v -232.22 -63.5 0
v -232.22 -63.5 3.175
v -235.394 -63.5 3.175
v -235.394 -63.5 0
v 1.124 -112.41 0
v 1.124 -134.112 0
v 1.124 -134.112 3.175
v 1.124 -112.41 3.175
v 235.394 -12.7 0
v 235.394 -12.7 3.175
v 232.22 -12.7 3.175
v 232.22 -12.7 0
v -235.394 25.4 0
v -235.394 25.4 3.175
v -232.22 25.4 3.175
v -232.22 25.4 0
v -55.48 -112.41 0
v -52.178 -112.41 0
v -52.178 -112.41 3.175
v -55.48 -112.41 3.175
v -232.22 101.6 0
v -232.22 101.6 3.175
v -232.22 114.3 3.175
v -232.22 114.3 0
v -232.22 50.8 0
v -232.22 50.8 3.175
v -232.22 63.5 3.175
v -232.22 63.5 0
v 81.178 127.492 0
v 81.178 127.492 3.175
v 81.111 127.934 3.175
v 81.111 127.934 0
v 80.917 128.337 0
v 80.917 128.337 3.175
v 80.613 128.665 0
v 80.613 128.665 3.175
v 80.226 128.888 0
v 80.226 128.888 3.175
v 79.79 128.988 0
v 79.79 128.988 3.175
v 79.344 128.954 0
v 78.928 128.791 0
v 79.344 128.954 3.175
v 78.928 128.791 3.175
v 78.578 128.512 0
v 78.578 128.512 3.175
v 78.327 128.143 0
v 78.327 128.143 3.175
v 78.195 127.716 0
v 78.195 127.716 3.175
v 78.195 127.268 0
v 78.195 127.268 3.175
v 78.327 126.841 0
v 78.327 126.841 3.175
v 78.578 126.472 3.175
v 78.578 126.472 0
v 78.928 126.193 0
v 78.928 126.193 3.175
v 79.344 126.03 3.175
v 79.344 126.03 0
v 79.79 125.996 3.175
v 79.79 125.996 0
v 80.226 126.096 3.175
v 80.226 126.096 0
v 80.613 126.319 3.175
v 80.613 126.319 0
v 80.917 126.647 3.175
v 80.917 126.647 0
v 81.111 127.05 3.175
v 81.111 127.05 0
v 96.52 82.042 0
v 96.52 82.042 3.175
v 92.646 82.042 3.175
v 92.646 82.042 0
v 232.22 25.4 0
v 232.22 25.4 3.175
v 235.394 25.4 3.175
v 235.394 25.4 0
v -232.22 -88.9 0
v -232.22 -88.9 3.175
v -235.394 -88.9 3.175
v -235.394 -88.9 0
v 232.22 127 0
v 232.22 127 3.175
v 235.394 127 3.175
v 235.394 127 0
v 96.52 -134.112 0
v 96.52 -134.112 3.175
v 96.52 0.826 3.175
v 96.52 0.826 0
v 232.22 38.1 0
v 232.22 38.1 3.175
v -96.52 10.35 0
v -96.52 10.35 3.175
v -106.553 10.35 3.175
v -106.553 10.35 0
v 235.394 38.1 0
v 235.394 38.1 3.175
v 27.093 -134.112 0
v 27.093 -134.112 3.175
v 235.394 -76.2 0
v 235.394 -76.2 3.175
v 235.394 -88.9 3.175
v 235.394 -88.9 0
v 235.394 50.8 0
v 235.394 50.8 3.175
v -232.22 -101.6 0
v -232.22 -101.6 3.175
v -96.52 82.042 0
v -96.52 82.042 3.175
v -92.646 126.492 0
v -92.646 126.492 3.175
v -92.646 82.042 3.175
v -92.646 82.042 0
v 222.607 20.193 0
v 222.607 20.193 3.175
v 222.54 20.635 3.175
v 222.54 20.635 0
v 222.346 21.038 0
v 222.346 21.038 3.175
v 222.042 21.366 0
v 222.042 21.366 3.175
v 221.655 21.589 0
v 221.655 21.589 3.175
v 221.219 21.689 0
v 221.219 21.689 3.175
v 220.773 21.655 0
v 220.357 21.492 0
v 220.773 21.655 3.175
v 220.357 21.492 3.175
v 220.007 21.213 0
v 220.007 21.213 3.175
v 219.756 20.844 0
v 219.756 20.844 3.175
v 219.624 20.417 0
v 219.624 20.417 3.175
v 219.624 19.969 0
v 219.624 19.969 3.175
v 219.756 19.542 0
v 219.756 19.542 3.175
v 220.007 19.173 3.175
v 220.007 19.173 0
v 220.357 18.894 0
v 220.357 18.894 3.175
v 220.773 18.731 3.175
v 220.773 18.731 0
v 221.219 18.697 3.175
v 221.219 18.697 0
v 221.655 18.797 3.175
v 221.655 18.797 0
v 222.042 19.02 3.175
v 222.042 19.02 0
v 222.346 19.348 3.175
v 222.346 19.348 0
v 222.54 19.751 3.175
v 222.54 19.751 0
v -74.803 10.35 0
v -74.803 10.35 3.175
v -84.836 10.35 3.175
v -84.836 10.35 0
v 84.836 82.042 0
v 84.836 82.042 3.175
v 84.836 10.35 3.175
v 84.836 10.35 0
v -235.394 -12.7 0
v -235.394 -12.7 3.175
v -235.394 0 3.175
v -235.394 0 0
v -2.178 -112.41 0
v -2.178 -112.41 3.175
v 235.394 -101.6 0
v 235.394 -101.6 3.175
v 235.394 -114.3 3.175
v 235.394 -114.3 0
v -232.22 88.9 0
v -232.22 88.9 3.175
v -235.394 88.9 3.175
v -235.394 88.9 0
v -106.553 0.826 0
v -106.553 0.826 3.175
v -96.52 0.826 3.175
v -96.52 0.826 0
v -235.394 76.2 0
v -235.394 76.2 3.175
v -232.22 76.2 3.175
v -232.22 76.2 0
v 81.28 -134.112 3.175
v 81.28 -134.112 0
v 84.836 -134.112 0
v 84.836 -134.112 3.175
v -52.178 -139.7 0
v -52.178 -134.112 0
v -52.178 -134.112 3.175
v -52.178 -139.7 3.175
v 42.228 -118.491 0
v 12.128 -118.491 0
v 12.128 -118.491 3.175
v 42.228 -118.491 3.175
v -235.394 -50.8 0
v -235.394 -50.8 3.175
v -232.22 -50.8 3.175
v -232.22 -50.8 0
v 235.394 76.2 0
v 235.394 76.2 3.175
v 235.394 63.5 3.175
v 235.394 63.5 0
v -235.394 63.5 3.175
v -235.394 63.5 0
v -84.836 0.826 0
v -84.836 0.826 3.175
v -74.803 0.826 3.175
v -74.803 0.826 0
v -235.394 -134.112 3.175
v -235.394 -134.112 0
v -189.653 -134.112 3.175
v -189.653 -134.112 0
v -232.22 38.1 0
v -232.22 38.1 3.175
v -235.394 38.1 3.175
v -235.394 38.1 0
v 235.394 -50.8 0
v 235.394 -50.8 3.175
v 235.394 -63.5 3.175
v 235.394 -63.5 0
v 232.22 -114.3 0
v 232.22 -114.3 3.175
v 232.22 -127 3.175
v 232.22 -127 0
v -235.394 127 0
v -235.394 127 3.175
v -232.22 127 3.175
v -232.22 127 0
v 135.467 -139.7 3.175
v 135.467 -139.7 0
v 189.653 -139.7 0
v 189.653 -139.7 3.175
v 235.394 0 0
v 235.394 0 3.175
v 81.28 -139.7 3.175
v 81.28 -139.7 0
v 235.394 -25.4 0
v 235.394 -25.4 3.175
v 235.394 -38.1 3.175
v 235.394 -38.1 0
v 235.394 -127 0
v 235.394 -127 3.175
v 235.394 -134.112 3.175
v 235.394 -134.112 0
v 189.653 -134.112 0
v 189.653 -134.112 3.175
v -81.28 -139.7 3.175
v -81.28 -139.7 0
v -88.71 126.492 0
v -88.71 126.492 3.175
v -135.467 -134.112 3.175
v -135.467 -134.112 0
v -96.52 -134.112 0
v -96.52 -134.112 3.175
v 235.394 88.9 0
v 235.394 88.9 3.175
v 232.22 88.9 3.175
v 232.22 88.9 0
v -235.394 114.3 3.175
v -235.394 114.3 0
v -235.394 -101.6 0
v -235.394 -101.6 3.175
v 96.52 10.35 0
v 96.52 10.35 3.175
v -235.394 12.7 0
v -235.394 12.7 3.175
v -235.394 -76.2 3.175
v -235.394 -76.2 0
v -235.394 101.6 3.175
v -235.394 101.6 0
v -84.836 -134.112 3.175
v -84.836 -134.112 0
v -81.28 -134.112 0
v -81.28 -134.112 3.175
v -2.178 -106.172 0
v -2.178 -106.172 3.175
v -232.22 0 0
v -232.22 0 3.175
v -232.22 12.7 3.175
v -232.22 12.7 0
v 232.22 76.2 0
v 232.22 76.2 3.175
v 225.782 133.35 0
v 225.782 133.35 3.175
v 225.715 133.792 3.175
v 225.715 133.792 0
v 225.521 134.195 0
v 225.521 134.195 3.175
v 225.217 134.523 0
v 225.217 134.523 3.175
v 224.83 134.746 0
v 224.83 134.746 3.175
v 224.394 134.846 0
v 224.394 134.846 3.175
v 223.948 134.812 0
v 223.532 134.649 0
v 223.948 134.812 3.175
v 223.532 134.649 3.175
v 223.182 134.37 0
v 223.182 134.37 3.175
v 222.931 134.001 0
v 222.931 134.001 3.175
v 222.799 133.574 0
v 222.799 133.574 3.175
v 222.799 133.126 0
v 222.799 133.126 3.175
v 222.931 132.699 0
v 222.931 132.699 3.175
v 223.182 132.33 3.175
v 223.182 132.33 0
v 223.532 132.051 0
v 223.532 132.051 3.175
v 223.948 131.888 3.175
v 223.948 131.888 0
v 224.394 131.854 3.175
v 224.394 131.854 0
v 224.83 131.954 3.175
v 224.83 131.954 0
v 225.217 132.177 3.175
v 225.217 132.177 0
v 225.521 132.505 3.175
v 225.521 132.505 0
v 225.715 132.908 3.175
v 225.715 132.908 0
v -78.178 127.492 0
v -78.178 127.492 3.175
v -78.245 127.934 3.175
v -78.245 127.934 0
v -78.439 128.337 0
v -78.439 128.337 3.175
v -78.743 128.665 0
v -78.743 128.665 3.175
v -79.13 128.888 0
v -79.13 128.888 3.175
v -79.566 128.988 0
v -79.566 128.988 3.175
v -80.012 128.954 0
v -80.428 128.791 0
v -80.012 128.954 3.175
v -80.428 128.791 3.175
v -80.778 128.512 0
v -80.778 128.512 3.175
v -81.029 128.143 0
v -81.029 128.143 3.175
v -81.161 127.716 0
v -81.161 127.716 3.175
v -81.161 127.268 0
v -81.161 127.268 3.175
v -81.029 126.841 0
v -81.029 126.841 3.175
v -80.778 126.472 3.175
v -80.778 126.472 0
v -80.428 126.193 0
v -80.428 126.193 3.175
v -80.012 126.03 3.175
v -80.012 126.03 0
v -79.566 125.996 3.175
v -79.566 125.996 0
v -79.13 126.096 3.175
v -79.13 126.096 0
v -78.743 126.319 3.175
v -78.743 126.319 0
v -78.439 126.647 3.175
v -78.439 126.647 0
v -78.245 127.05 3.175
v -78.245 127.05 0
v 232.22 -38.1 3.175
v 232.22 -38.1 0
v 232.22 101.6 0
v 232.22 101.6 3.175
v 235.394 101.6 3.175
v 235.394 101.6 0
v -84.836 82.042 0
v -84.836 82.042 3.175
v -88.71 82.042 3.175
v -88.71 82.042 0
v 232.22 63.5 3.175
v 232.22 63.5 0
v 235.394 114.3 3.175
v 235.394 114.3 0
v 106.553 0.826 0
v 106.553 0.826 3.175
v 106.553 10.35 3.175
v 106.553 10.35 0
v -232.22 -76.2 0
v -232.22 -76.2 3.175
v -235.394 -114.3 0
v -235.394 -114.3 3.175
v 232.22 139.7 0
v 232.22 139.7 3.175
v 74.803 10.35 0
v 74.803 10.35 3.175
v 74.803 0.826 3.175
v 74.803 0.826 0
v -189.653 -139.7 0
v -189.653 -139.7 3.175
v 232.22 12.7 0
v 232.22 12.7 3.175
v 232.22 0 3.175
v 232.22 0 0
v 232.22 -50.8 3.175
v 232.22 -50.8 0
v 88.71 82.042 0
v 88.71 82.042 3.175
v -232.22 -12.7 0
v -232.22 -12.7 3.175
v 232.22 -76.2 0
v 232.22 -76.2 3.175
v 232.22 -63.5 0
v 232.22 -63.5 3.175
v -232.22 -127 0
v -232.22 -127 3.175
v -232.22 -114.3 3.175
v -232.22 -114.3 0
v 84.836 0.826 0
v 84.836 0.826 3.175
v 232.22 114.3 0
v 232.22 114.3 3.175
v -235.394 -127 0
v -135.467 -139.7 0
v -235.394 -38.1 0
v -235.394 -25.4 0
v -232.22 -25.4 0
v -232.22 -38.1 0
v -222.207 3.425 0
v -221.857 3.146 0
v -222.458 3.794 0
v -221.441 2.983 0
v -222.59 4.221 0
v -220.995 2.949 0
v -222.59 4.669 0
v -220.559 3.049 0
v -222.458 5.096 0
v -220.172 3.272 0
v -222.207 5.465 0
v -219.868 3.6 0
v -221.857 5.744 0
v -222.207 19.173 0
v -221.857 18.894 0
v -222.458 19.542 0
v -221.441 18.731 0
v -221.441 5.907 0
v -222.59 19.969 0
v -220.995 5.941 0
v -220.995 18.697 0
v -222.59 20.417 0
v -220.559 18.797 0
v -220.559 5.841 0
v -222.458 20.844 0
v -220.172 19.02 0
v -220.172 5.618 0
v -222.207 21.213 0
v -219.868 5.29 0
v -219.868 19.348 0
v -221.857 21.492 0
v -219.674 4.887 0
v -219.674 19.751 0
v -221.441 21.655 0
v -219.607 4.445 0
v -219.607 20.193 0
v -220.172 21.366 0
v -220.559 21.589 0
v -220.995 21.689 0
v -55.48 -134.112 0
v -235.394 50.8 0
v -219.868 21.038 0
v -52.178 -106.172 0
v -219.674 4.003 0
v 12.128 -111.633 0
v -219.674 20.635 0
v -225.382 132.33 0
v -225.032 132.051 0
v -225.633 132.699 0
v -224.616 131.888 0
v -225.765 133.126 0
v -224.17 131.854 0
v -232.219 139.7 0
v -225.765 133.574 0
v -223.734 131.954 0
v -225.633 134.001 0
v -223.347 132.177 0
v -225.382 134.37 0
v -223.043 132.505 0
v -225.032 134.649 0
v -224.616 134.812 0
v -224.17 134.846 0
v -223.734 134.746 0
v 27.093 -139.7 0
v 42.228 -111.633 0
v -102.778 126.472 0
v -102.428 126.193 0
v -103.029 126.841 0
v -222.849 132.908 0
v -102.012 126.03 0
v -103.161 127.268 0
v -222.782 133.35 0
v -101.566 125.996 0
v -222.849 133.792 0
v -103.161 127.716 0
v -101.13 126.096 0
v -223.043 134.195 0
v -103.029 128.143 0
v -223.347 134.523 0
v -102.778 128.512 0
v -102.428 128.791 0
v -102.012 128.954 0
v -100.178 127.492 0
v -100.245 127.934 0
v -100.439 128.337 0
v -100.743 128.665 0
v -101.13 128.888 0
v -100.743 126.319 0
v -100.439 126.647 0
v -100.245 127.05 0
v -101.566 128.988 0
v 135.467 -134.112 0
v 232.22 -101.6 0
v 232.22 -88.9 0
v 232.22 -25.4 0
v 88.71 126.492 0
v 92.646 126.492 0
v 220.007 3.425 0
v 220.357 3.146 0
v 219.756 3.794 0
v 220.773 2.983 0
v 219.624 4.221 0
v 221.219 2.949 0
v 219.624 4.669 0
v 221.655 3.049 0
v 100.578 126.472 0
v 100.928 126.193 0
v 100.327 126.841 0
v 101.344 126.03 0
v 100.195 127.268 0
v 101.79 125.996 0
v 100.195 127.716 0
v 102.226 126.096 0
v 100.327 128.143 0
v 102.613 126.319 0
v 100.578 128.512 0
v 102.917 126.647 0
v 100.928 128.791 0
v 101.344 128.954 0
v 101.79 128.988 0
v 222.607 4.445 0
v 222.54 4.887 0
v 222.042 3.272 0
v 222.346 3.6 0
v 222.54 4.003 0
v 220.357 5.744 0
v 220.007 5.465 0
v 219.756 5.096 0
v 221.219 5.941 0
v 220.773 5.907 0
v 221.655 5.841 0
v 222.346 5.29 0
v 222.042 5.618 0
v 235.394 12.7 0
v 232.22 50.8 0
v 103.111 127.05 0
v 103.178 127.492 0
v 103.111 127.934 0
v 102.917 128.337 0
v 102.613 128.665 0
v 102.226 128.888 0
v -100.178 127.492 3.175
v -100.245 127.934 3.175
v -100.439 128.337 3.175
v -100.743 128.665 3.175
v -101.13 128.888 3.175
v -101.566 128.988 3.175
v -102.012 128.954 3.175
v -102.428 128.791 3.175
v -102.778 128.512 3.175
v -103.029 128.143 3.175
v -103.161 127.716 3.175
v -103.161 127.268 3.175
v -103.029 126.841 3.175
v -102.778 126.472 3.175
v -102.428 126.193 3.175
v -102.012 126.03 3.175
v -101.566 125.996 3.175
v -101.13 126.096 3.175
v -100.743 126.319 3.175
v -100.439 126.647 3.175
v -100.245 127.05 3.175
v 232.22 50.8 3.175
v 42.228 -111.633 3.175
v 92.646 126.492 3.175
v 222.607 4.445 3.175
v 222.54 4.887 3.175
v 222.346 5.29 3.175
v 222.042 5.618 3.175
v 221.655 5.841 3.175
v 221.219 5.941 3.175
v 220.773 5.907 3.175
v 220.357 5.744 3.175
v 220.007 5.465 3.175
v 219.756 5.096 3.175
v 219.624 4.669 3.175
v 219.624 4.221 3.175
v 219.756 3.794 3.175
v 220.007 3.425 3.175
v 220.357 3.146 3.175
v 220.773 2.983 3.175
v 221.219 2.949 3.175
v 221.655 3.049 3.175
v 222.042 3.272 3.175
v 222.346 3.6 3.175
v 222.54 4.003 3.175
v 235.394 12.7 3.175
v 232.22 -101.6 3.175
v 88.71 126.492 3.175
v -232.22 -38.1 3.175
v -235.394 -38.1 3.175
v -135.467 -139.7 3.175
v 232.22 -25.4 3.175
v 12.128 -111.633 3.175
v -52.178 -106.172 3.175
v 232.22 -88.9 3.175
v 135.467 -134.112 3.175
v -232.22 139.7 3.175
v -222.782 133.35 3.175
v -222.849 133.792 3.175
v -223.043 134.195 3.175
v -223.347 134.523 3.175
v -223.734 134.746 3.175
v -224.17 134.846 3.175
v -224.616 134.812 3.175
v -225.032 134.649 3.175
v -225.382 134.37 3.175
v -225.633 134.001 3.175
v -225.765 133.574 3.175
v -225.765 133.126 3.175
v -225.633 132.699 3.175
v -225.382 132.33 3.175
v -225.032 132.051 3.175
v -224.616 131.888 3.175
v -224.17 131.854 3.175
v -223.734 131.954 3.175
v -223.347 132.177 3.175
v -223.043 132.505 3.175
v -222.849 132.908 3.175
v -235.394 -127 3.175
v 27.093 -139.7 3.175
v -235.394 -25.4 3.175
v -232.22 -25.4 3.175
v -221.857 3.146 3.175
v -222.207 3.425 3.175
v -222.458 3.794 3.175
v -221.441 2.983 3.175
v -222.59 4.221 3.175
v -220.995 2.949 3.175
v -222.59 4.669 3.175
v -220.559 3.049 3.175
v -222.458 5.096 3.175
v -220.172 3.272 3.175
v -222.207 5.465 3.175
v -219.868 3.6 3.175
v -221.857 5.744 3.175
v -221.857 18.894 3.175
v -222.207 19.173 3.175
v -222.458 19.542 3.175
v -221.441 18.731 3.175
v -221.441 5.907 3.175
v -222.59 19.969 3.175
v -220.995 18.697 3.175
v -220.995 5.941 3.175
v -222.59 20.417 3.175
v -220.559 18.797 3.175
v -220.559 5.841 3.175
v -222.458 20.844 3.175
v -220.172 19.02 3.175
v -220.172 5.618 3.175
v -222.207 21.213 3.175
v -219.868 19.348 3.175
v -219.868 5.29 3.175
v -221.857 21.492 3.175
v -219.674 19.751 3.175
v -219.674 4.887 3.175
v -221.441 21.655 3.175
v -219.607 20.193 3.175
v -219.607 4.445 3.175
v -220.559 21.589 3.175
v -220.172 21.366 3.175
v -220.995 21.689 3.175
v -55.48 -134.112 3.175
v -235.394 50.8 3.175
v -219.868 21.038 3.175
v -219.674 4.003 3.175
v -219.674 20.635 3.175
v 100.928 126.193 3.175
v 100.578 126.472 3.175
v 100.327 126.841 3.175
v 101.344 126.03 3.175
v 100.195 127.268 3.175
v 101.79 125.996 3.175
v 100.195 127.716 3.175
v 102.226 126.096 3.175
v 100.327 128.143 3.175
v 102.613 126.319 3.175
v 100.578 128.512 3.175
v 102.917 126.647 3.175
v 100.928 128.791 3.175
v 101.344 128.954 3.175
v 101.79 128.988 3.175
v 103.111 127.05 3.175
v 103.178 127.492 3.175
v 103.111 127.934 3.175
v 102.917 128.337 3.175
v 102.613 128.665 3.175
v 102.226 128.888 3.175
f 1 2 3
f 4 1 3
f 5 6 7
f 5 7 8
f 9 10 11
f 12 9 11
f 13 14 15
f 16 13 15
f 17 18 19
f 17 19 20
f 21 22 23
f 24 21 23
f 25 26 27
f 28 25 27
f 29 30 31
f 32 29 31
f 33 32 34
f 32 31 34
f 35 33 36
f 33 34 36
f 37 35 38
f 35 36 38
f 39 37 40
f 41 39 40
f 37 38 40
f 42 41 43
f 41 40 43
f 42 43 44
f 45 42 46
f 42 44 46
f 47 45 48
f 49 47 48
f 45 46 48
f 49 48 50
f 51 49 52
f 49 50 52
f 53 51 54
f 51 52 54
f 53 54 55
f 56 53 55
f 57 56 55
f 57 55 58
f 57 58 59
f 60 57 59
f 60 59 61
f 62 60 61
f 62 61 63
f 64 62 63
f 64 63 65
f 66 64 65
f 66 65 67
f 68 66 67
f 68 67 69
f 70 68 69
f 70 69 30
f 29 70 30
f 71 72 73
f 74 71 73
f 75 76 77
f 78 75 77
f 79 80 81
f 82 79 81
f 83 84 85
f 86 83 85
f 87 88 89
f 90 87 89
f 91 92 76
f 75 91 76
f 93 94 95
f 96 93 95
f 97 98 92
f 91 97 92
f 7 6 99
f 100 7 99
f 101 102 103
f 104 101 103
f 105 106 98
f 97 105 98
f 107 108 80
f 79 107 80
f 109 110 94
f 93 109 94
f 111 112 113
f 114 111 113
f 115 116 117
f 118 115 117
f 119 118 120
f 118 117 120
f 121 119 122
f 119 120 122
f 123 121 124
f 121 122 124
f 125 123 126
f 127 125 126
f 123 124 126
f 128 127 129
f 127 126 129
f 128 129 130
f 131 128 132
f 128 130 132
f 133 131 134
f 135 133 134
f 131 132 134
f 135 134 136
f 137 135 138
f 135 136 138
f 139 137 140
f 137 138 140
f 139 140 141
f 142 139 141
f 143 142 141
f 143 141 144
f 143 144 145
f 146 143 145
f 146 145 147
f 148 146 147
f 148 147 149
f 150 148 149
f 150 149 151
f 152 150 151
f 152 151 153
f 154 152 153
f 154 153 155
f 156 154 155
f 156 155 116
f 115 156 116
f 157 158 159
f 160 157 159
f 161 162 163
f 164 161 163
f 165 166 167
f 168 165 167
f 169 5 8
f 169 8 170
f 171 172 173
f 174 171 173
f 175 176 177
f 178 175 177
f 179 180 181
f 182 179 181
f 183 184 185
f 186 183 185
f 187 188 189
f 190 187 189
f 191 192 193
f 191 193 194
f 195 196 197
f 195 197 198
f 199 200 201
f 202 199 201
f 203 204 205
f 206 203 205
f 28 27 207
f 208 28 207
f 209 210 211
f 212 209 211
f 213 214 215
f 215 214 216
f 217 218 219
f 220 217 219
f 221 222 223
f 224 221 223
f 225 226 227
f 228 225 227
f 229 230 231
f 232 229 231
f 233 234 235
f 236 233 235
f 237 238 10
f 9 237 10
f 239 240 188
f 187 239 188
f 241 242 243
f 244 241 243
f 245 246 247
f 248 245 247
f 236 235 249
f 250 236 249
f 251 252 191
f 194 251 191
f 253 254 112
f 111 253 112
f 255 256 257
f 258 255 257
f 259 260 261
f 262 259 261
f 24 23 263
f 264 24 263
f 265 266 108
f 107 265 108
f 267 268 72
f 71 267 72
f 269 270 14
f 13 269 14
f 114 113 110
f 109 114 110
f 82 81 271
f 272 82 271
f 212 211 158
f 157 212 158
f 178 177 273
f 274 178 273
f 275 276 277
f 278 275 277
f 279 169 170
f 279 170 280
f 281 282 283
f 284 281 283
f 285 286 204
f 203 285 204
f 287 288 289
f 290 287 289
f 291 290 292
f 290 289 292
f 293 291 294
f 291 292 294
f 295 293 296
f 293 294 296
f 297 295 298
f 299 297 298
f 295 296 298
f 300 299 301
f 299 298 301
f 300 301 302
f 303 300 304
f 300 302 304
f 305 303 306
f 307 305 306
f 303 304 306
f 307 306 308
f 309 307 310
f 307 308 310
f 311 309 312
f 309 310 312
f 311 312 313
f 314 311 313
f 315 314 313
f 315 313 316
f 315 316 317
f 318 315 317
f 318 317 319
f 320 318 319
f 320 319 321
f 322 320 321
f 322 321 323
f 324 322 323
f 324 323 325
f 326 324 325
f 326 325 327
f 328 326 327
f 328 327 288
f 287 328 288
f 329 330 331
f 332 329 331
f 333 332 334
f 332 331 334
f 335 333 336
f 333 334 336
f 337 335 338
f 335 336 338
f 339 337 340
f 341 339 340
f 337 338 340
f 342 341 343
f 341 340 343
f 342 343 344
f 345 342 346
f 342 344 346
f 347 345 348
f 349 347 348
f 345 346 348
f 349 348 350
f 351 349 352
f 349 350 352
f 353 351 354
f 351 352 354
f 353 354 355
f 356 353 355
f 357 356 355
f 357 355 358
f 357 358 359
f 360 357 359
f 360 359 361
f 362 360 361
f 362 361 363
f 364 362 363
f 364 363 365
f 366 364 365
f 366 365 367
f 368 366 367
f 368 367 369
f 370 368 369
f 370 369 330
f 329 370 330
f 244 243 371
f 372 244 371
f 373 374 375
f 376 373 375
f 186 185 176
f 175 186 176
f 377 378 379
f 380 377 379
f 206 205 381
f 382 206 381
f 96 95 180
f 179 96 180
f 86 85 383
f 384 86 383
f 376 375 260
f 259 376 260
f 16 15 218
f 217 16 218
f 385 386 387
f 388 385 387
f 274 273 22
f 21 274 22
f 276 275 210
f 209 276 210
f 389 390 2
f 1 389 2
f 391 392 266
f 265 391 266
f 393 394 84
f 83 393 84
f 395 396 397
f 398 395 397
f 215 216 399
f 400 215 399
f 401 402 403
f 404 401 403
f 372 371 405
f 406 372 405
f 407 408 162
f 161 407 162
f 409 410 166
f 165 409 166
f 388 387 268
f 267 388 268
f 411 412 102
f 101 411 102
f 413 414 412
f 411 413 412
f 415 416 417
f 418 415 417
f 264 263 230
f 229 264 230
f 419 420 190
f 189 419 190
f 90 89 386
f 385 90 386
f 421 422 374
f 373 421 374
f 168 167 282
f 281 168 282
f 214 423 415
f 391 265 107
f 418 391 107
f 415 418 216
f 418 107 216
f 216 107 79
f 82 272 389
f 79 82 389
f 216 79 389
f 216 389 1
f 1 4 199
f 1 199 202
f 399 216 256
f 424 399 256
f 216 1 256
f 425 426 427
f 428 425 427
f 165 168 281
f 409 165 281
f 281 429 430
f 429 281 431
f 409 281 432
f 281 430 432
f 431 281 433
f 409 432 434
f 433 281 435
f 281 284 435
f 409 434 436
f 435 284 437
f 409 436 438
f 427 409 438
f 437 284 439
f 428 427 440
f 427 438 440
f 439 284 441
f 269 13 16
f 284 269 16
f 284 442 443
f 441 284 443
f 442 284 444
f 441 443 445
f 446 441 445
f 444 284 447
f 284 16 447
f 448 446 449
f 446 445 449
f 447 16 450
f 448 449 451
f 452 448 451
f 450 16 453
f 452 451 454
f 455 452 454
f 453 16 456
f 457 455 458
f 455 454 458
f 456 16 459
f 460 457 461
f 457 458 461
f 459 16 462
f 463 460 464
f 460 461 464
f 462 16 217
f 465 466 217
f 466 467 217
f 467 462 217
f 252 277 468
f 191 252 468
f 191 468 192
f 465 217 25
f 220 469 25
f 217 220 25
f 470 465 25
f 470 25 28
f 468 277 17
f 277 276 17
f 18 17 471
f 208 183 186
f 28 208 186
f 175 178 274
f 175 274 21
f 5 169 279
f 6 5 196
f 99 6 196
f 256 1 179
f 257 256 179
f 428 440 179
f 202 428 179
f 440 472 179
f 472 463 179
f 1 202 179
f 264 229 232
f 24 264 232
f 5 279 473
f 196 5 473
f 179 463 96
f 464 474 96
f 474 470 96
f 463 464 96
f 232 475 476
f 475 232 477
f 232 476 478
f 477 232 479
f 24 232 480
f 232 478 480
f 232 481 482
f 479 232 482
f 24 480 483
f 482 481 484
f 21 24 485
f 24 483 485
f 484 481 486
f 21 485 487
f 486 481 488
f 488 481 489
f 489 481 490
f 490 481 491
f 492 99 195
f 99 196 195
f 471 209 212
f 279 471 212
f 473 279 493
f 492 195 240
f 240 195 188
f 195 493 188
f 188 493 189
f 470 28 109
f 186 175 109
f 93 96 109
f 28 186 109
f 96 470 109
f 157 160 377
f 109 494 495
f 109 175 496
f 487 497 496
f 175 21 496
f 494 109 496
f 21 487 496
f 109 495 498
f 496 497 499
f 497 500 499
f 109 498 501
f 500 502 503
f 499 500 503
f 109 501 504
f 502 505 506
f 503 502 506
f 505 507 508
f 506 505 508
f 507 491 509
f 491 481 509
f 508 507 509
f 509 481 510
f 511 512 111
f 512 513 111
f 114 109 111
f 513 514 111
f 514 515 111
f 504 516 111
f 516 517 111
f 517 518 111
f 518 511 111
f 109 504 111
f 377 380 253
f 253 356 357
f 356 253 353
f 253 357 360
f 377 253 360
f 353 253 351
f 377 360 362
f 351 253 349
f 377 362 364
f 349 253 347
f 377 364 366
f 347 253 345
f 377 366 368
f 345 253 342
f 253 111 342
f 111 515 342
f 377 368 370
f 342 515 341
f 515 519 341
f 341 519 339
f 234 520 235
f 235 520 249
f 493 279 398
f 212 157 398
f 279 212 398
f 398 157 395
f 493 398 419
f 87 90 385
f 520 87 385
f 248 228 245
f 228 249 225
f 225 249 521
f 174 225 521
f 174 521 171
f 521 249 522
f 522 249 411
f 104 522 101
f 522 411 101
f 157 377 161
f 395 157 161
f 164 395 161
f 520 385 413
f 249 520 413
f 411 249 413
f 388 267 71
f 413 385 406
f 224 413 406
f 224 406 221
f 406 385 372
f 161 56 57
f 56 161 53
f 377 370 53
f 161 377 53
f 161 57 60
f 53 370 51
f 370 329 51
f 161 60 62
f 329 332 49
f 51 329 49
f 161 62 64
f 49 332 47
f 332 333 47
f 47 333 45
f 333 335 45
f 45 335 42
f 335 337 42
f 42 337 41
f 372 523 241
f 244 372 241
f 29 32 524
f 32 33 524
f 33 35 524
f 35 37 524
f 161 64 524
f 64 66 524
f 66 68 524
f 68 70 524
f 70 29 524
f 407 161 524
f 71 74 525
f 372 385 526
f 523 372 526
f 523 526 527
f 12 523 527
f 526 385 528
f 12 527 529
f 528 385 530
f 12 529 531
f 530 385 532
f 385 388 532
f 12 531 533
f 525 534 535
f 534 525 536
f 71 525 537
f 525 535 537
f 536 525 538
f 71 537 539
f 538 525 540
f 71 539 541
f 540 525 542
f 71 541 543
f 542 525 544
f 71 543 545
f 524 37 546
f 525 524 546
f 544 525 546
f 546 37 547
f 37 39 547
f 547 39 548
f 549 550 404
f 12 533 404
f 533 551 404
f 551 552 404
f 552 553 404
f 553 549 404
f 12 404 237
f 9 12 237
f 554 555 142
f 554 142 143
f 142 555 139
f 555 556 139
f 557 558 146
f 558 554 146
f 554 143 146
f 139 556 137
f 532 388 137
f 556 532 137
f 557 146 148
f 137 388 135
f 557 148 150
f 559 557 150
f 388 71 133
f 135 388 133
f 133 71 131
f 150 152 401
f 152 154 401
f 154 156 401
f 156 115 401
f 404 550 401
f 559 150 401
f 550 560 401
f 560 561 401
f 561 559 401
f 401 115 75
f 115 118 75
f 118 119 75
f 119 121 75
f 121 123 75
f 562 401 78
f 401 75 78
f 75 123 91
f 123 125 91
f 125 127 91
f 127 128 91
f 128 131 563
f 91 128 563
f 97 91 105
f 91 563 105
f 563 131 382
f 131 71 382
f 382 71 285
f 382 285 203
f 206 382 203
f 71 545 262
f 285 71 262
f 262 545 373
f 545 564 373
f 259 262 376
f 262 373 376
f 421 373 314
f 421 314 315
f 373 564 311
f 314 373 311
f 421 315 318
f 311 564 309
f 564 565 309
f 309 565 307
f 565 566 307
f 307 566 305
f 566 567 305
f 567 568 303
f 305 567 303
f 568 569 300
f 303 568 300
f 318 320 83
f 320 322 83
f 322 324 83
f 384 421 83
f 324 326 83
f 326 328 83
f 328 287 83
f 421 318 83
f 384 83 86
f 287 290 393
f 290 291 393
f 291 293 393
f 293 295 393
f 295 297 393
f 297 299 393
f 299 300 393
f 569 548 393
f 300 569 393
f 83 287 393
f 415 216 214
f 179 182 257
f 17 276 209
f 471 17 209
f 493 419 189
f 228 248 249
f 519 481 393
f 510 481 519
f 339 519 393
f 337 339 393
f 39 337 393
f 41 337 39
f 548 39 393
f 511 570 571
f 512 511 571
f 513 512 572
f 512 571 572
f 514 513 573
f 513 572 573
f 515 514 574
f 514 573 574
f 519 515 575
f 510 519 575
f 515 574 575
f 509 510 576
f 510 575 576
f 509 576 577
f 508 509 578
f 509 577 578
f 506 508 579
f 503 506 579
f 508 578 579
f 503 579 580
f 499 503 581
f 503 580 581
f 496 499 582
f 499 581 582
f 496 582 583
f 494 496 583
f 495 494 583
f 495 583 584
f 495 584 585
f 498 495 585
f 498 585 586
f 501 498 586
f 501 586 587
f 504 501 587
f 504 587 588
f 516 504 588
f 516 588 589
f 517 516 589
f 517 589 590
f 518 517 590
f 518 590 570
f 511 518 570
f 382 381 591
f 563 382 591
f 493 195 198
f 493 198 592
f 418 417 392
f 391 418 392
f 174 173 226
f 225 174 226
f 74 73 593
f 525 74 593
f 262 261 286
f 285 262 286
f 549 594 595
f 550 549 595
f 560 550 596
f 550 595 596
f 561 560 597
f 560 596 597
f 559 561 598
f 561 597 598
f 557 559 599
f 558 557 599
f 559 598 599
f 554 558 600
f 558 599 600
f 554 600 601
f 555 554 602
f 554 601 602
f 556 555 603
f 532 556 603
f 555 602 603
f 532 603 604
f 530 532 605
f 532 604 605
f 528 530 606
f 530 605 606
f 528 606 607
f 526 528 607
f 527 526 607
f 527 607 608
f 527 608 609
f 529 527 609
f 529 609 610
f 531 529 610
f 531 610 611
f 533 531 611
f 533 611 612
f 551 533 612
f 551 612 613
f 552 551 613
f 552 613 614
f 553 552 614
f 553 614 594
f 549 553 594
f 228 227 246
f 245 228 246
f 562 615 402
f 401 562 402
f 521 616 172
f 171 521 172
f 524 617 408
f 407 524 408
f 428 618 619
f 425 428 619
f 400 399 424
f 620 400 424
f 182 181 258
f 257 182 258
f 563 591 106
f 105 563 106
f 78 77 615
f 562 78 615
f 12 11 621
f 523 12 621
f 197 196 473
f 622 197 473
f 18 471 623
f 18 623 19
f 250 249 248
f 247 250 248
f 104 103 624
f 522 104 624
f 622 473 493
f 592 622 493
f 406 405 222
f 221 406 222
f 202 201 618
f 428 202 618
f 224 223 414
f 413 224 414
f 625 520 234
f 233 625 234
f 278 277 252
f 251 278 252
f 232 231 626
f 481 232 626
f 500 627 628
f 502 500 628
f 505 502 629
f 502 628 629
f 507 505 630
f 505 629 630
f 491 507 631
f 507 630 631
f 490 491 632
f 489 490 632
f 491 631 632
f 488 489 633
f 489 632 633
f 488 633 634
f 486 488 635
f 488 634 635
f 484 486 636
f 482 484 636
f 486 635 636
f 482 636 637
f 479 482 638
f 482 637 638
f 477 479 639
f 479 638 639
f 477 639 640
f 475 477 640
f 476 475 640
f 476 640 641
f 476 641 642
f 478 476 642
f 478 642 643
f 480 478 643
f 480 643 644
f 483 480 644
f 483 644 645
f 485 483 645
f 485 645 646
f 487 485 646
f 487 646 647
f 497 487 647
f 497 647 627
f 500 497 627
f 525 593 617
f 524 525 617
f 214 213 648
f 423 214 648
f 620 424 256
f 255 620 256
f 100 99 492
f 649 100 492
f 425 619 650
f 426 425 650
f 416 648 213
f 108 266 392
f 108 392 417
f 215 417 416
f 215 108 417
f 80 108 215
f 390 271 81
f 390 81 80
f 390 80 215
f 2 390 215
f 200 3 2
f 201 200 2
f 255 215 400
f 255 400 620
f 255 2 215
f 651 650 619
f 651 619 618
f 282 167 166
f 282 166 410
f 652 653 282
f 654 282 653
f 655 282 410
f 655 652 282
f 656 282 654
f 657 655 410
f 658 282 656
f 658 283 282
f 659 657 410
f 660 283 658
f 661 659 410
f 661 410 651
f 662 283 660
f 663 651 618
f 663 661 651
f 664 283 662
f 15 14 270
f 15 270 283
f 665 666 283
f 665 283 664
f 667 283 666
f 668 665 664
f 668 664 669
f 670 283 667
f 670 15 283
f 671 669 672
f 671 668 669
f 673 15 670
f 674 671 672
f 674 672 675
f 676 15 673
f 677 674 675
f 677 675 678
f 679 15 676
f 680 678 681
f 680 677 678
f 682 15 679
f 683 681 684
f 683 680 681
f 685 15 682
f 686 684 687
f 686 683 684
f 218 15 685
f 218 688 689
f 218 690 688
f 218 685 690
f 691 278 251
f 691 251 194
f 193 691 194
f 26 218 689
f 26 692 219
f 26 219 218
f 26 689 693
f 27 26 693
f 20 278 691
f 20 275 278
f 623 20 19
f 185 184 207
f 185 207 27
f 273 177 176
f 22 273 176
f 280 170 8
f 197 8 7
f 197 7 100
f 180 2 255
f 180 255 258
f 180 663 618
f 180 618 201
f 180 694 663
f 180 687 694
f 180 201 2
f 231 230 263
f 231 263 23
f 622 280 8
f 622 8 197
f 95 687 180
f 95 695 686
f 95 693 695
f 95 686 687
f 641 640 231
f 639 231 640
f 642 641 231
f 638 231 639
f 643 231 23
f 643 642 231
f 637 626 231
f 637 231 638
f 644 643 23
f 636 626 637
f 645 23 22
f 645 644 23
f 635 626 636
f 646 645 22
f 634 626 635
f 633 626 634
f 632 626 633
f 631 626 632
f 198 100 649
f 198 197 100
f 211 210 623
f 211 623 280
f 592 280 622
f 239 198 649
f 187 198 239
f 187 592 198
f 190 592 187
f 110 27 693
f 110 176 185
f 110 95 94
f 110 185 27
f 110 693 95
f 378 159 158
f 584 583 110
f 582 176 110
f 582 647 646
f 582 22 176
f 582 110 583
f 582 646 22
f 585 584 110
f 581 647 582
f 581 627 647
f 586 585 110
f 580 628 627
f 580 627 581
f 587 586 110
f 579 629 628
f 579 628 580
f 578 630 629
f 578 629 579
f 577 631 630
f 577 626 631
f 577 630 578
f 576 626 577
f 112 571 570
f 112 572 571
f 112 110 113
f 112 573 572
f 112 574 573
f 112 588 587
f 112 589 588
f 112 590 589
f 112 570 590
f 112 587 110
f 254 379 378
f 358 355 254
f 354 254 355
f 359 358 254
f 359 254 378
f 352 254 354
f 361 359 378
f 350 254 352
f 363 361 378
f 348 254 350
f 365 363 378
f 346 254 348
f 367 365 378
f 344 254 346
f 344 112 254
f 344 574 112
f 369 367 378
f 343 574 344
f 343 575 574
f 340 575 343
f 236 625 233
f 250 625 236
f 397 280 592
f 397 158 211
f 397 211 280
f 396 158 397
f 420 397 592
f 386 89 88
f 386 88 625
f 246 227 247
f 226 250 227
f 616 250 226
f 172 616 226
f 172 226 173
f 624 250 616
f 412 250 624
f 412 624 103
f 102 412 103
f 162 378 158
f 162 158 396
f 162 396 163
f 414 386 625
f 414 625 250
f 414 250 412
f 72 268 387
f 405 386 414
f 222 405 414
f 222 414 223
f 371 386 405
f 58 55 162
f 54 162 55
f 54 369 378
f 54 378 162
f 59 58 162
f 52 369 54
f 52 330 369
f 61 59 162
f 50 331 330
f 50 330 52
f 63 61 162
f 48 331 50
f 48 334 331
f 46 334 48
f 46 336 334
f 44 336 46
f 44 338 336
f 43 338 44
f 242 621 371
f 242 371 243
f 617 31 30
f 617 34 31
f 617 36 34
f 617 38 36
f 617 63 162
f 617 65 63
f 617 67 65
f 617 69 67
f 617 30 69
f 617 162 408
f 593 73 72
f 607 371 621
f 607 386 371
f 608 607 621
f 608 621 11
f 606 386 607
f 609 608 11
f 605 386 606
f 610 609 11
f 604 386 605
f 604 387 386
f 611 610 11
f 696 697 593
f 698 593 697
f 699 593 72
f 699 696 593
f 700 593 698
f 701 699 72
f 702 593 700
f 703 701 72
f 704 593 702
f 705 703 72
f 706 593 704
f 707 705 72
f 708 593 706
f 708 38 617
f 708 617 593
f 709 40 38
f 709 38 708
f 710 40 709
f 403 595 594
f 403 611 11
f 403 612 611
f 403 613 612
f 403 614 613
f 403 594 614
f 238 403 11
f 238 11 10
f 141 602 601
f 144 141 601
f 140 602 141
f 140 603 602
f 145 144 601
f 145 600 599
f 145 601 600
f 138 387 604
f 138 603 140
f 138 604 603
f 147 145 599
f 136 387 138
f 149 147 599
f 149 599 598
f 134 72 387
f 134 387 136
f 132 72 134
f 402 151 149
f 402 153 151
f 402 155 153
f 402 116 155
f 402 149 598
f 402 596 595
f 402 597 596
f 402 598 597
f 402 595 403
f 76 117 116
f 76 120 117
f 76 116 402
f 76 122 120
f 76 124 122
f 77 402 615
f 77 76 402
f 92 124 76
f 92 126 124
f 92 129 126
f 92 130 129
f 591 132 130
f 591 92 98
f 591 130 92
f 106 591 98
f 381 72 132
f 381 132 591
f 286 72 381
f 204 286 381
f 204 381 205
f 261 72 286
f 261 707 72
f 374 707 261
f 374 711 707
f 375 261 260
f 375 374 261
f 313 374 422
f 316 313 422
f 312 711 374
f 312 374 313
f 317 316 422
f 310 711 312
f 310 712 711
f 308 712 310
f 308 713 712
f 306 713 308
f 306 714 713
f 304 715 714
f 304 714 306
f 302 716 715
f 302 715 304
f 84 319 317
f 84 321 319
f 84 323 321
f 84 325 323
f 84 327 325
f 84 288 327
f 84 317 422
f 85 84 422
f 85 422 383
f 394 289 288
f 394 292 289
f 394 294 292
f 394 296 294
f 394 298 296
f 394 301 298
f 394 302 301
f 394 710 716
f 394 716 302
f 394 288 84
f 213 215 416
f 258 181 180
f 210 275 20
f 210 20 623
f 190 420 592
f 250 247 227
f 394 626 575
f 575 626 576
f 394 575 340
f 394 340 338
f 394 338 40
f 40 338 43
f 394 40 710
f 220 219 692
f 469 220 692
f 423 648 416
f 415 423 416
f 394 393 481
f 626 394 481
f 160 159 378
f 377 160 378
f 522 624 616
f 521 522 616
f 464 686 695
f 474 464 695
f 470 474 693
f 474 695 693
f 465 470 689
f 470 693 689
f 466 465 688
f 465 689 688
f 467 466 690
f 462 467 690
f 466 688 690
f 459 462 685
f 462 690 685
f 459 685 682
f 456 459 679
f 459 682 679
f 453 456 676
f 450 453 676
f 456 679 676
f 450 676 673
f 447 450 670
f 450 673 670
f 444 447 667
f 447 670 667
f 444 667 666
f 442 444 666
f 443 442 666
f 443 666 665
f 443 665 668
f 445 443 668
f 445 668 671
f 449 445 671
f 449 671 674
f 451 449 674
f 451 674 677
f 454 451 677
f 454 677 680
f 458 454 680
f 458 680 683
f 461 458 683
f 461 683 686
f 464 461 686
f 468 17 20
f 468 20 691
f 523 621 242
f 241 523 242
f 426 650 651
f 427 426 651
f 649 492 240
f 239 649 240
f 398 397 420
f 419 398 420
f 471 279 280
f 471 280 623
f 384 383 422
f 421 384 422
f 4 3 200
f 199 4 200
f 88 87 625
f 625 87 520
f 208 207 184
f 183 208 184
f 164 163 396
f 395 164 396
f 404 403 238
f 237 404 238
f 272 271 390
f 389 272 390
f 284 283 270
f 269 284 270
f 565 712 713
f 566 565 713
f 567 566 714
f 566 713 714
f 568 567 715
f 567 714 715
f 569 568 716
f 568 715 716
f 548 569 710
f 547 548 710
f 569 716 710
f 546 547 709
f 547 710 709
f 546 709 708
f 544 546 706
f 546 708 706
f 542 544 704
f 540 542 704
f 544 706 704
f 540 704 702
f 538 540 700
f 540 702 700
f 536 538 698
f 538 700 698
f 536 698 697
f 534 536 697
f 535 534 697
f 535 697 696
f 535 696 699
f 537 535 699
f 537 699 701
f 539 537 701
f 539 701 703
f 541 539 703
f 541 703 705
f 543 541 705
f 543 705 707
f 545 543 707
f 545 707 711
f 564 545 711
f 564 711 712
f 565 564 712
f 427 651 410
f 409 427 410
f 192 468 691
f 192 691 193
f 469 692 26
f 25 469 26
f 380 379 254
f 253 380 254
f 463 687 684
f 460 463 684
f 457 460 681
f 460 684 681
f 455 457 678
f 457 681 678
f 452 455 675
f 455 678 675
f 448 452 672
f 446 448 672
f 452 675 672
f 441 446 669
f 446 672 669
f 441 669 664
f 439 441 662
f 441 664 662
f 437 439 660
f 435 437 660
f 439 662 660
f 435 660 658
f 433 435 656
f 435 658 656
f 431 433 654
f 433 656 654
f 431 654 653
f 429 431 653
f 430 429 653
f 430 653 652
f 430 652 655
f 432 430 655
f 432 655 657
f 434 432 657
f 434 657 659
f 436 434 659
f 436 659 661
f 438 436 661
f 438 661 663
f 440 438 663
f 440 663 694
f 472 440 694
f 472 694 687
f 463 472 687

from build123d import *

# Parameters (mm, degrees)
SKETCH1_W                    = 3.175
SKETCH1_H                    = 12.7
MAIN_EXTRUDE_DEPTH           = 3.175
SKETCH8_R                    = 1.5
SKETCH8_W                    = 3.175
SKETCH8_H                    = 31.877
MOUNT_HOLES_DEPTH            = 430.752406189
DOOR_SLOTS_DEPTH             = 430.752406189
SKETCH4_W                    = 30.099999998
SKETCH4_H                    = 6.858
TROUGH_AND_LEVER_HOLES_DEPTH = 430.752406189
SKETCH10_R                   = 1.5
DOOR_GUIDE_MOUNT_HOLES_DEPTH = 430.752406189
SKETCH12_R                   = 1.5
EXTENSION_CLIP_HOLES_DEPTH   = 430.752406189
EXTENSION_CENTER_CUT_DEPTH   = 430.752406189


with BuildPart() as part:
    # Sketch1 → Main Extrude (new body)
    with BuildSketch(Plane.XY):
        Polygon((-381, 139.7), (-406.4, 139.7), (-406.4, -139.7), (-352.213333333, -139.7), (-352.213333333, -134.112), (-298.026666667, -134.112), (-298.026666667, -139.7), (-243.84, -139.7), (-243.84, -134.112), (-189.653333333, -134.112), (-189.653333333, -139.7), (-135.466666667, -139.7), (-135.466666667, -134.112), (-81.28, -134.112), (-81.28, -139.7), (-27.093333333, -139.7), (-27.093333333, -134.112), (27.093333333, -134.112), (27.093333333, -139.7), (81.28, -139.7), (81.28, -134.112), (135.466666667, -134.112), (135.466666667, -139.7), (189.653333333, -139.7), (189.653333333, -134.112), (243.84, -134.112), (243.84, -139.7), (298.026666667, -139.7), (298.026666667, -134.112), (352.213333333, -134.112), (352.213333333, -139.7), (406.4, -139.7), (406.4, 139.7), (381, 139.7), (381, 127), (377.825, 127), (377.825, 139.7), (-377.825, 139.7), (-377.825, 127), (-381, 127), align=None)
        with Locations((-379.4125, 107.95)):
            Rectangle(SKETCH1_W, SKETCH1_H, mode=Mode.SUBTRACT)
        with Locations((-379.4125, 82.55)):
            Rectangle(SKETCH1_W, SKETCH1_H, mode=Mode.SUBTRACT)
        with Locations((-379.4125, 57.15)):
            Rectangle(SKETCH1_W, SKETCH1_H, mode=Mode.SUBTRACT)
        with Locations((-379.4125, 31.75)):
            Rectangle(SKETCH1_W, SKETCH1_H, mode=Mode.SUBTRACT)
        with Locations((-379.4125, 6.35)):
            Rectangle(SKETCH1_W, SKETCH1_H, mode=Mode.SUBTRACT)
        with Locations((-379.4125, -19.05)):
            Rectangle(SKETCH1_W, SKETCH1_H, mode=Mode.SUBTRACT)
        with Locations((-379.4125, -44.45)):
            Rectangle(SKETCH1_W, SKETCH1_H, mode=Mode.SUBTRACT)
        with Locations((-379.4125, -69.85)):
            Rectangle(SKETCH1_W, SKETCH1_H, mode=Mode.SUBTRACT)
        with Locations((-379.4125, -95.25)):
            Rectangle(SKETCH1_W, SKETCH1_H, mode=Mode.SUBTRACT)
        with Locations((-379.4125, -120.65)):
            Rectangle(SKETCH1_W, SKETCH1_H, mode=Mode.SUBTRACT)
        with Locations((379.4125, 107.95)):
            Rectangle(SKETCH1_W, SKETCH1_H, mode=Mode.SUBTRACT)
        with Locations((379.4125, 82.55)):
            Rectangle(SKETCH1_W, SKETCH1_H, mode=Mode.SUBTRACT)
        with Locations((379.4125, 57.15)):
            Rectangle(SKETCH1_W, SKETCH1_H, mode=Mode.SUBTRACT)
        with Locations((379.4125, 31.75)):
            Rectangle(SKETCH1_W, SKETCH1_H, mode=Mode.SUBTRACT)
        with Locations((379.4125, 6.35)):
            Rectangle(SKETCH1_W, SKETCH1_H, mode=Mode.SUBTRACT)
        with Locations((379.4125, -19.05)):
            Rectangle(SKETCH1_W, SKETCH1_H, mode=Mode.SUBTRACT)
        with Locations((379.4125, -44.45)):
            Rectangle(SKETCH1_W, SKETCH1_H, mode=Mode.SUBTRACT)
        with Locations((379.4125, -69.85)):
            Rectangle(SKETCH1_W, SKETCH1_H, mode=Mode.SUBTRACT)
        with Locations((379.4125, -95.25)):
            Rectangle(SKETCH1_W, SKETCH1_H, mode=Mode.SUBTRACT)
        with Locations((379.4125, -120.65)):
            Rectangle(SKETCH1_W, SKETCH1_H, mode=Mode.SUBTRACT)
    extrude(amount=MAIN_EXTRUDE_DEPTH)

    # Sketch8 → Mount Holes (cut, through all)
    with BuildSketch(Plane.XY.offset(3.175)):
        with Locations((-393.7, -120.65)):
            Circle(SKETCH8_R)
        with Locations((393.7, -120.65)):
            Circle(SKETCH8_R)
        with Locations((-382.5875, 12.319)):
            Rectangle(SKETCH8_W, SKETCH8_H)
        with Locations((382.5875, 12.319)):
            Rectangle(SKETCH8_W, SKETCH8_H)
    extrude(amount=-MOUNT_HOLES_DEPTH, mode=Mode.SUBTRACT)

    # Sketch3 → Door Slots (cut, through all)
    with BuildSketch(Plane.XY.offset(3.175)):
        Polygon((-88.7095, 126.492), (-92.6465, 126.492), (-92.6465, 82.042), (-96.52, 82.042), (-96.52, 10.3505), (-106.553, 10.3505), (-106.553, 0.8255), (-96.52, 0.8255), (-96.52, -134.112), (-84.836, -134.112), (-84.836, 0.8255), (-74.803, 0.8255), (-74.803, 10.3505), (-84.836, 10.3505), (-84.836, 82.042), (-88.7095, 82.042), align=None)
        Polygon((92.6465, 126.492), (88.7095, 126.492), (88.7095, 82.042), (84.836, 82.042), (84.836, 10.3505), (74.803, 10.3505), (74.803, 0.8255), (84.836, 0.8255), (84.836, -134.112), (96.52, -134.112), (96.52, 0.8255), (106.553, 0.8255), (106.553, 10.3505), (96.52, 10.3505), (96.52, 82.042), (92.6465, 82.042), align=None)
    extrude(amount=-DOOR_SLOTS_DEPTH, mode=Mode.SUBTRACT)

    # Sketch4 → Trough and Lever Holes (cut, through all)
    with BuildSketch(Plane.XY):
        Polygon((-52.178, -112.41), (-55.48, -112.41), (-55.48, -134.112), (-52.178, -134.112), (-52.178, -139.7), (-2.178, -139.7), (-2.178, -134.112), (1.124, -134.112), (1.124, -112.41), (-2.178, -112.41), (-2.178, -106.172), (-52.178, -106.172), align=None)
        with Locations((27.178, -115.062)):
            Rectangle(SKETCH4_W, SKETCH4_H)
    extrude(amount=TROUGH_AND_LEVER_HOLES_DEPTH, mode=Mode.SUBTRACT)

    # Sketch10 → Door Guide Mount Holes (cut, through all)
    with BuildSketch(Plane.XY.offset(3.175)):
        with Locations((-101.678, 127.492)):
            Circle(SKETCH10_R)
        with Locations((-79.678, 127.492)):
            Circle(SKETCH10_R)
        with Locations((79.678, 127.492)):
            Circle(SKETCH10_R)
        with Locations((101.678, 127.492)):
            Circle(SKETCH10_R)
    extrude(amount=-DOOR_GUIDE_MOUNT_HOLES_DEPTH, mode=Mode.SUBTRACT)

    # Sketch12 → Extension Clip Holes (cut, through all)
    with BuildSketch(Plane.XY.offset(3.175)):
        with Locations((-246.507, 20.193)):
            Circle(SKETCH12_R)
        with Locations((-246.507, 4.445)):
            Circle(SKETCH12_R)
        with Locations((-221.107, 4.445)):
            Circle(SKETCH12_R)
        with Locations((-221.107, 20.193)):
            Circle(SKETCH12_R)
        with Locations((-243.332, 133.35)):
            Circle(SKETCH12_R)
        with Locations((-224.282, 133.35)):
            Circle(SKETCH12_R)
        with Locations((224.282, 133.35)):
            Circle(SKETCH12_R)
        with Locations((243.332, 133.35)):
            Circle(SKETCH12_R)
        with Locations((221.107, 20.193)):
            Circle(SKETCH12_R)
        with Locations((221.107, 4.445)):
            Circle(SKETCH12_R)
        with Locations((246.507, 4.445)):
            Circle(SKETCH12_R)
        with Locations((246.507, 20.193)):
            Circle(SKETCH12_R)
    extrude(amount=-EXTENSION_CLIP_HOLES_DEPTH, mode=Mode.SUBTRACT)

    # Sketch11<3> → Extension Center Cut (cut, through all)
    with BuildSketch(Plane.XY.offset(3.175)):
        Polygon((-232.2195, 127), (-232.2195, 139.7), (-406.4, 139.7), (-406.4, -139.7), (-235.3945, -139.7), (-235.3945, -127), (-232.2195, -127), (-232.2195, -114.3), (-235.3945, -114.3), (-235.3945, -101.6), (-232.2195, -101.6), (-232.2195, -88.9), (-235.3945, -88.9), (-235.3945, -76.2), (-232.2195, -76.2), (-232.2195, -63.5), (-235.3945, -63.5), (-235.3945, -50.8), (-232.2195, -50.8), (-232.2195, -38.1), (-235.3945, -38.1), (-235.3945, -25.4), (-232.2195, -25.4), (-232.2195, -12.7), (-235.3945, -12.7), (-235.3945, 0), (-232.2195, 0), (-232.2195, 12.7), (-235.3945, 12.7), (-235.3945, 25.4), (-232.2195, 25.4), (-232.2195, 38.1), (-235.3945, 38.1), (-235.3945, 50.8), (-232.2195, 50.8), (-232.2195, 63.5), (-235.3945, 63.5), (-235.3945, 76.2), (-232.2195, 76.2), (-232.2195, 88.9), (-235.3945, 88.9), (-235.3945, 101.6), (-232.2195, 101.6), (-232.2195, 114.3), (-235.3945, 114.3), (-235.3945, 127), align=None)
        Polygon((406.4, 139.7), (232.2195, 139.7), (232.2195, 127), (235.3945, 127), (235.3945, 114.3), (232.2195, 114.3), (232.2195, 101.6), (235.3945, 101.6), (235.3945, 88.9), (232.2195, 88.9), (232.2195, 76.2), (235.3945, 76.2), (235.3945, 63.5), (232.2195, 63.5), (232.2195, 50.8), (235.3945, 50.8), (235.3945, 38.1), (232.2195, 38.1), (232.2195, 25.4), (235.3945, 25.4), (235.3945, 12.7), (232.2195, 12.7), (232.2195, 0), (235.3945, 0), (235.3945, -12.7), (232.2195, -12.7), (232.2195, -25.4), (235.3945, -25.4), (235.3945, -38.1), (232.2195, -38.1), (232.2195, -50.8), (235.3945, -50.8), (235.3945, -63.5), (232.2195, -63.5), (232.2195, -76.2), (235.3945, -76.2), (235.3945, -88.9), (232.2195, -88.9), (232.2195, -101.6), (235.3945, -101.6), (235.3945, -114.3), (232.2195, -114.3), (232.2195, -127), (235.3945, -127), (235.3945, -139.7), (406.4, -139.7), align=None)
    extrude(amount=-EXTENSION_CENTER_CUT_DEPTH, mode=Mode.SUBTRACT)


solid = part.part
